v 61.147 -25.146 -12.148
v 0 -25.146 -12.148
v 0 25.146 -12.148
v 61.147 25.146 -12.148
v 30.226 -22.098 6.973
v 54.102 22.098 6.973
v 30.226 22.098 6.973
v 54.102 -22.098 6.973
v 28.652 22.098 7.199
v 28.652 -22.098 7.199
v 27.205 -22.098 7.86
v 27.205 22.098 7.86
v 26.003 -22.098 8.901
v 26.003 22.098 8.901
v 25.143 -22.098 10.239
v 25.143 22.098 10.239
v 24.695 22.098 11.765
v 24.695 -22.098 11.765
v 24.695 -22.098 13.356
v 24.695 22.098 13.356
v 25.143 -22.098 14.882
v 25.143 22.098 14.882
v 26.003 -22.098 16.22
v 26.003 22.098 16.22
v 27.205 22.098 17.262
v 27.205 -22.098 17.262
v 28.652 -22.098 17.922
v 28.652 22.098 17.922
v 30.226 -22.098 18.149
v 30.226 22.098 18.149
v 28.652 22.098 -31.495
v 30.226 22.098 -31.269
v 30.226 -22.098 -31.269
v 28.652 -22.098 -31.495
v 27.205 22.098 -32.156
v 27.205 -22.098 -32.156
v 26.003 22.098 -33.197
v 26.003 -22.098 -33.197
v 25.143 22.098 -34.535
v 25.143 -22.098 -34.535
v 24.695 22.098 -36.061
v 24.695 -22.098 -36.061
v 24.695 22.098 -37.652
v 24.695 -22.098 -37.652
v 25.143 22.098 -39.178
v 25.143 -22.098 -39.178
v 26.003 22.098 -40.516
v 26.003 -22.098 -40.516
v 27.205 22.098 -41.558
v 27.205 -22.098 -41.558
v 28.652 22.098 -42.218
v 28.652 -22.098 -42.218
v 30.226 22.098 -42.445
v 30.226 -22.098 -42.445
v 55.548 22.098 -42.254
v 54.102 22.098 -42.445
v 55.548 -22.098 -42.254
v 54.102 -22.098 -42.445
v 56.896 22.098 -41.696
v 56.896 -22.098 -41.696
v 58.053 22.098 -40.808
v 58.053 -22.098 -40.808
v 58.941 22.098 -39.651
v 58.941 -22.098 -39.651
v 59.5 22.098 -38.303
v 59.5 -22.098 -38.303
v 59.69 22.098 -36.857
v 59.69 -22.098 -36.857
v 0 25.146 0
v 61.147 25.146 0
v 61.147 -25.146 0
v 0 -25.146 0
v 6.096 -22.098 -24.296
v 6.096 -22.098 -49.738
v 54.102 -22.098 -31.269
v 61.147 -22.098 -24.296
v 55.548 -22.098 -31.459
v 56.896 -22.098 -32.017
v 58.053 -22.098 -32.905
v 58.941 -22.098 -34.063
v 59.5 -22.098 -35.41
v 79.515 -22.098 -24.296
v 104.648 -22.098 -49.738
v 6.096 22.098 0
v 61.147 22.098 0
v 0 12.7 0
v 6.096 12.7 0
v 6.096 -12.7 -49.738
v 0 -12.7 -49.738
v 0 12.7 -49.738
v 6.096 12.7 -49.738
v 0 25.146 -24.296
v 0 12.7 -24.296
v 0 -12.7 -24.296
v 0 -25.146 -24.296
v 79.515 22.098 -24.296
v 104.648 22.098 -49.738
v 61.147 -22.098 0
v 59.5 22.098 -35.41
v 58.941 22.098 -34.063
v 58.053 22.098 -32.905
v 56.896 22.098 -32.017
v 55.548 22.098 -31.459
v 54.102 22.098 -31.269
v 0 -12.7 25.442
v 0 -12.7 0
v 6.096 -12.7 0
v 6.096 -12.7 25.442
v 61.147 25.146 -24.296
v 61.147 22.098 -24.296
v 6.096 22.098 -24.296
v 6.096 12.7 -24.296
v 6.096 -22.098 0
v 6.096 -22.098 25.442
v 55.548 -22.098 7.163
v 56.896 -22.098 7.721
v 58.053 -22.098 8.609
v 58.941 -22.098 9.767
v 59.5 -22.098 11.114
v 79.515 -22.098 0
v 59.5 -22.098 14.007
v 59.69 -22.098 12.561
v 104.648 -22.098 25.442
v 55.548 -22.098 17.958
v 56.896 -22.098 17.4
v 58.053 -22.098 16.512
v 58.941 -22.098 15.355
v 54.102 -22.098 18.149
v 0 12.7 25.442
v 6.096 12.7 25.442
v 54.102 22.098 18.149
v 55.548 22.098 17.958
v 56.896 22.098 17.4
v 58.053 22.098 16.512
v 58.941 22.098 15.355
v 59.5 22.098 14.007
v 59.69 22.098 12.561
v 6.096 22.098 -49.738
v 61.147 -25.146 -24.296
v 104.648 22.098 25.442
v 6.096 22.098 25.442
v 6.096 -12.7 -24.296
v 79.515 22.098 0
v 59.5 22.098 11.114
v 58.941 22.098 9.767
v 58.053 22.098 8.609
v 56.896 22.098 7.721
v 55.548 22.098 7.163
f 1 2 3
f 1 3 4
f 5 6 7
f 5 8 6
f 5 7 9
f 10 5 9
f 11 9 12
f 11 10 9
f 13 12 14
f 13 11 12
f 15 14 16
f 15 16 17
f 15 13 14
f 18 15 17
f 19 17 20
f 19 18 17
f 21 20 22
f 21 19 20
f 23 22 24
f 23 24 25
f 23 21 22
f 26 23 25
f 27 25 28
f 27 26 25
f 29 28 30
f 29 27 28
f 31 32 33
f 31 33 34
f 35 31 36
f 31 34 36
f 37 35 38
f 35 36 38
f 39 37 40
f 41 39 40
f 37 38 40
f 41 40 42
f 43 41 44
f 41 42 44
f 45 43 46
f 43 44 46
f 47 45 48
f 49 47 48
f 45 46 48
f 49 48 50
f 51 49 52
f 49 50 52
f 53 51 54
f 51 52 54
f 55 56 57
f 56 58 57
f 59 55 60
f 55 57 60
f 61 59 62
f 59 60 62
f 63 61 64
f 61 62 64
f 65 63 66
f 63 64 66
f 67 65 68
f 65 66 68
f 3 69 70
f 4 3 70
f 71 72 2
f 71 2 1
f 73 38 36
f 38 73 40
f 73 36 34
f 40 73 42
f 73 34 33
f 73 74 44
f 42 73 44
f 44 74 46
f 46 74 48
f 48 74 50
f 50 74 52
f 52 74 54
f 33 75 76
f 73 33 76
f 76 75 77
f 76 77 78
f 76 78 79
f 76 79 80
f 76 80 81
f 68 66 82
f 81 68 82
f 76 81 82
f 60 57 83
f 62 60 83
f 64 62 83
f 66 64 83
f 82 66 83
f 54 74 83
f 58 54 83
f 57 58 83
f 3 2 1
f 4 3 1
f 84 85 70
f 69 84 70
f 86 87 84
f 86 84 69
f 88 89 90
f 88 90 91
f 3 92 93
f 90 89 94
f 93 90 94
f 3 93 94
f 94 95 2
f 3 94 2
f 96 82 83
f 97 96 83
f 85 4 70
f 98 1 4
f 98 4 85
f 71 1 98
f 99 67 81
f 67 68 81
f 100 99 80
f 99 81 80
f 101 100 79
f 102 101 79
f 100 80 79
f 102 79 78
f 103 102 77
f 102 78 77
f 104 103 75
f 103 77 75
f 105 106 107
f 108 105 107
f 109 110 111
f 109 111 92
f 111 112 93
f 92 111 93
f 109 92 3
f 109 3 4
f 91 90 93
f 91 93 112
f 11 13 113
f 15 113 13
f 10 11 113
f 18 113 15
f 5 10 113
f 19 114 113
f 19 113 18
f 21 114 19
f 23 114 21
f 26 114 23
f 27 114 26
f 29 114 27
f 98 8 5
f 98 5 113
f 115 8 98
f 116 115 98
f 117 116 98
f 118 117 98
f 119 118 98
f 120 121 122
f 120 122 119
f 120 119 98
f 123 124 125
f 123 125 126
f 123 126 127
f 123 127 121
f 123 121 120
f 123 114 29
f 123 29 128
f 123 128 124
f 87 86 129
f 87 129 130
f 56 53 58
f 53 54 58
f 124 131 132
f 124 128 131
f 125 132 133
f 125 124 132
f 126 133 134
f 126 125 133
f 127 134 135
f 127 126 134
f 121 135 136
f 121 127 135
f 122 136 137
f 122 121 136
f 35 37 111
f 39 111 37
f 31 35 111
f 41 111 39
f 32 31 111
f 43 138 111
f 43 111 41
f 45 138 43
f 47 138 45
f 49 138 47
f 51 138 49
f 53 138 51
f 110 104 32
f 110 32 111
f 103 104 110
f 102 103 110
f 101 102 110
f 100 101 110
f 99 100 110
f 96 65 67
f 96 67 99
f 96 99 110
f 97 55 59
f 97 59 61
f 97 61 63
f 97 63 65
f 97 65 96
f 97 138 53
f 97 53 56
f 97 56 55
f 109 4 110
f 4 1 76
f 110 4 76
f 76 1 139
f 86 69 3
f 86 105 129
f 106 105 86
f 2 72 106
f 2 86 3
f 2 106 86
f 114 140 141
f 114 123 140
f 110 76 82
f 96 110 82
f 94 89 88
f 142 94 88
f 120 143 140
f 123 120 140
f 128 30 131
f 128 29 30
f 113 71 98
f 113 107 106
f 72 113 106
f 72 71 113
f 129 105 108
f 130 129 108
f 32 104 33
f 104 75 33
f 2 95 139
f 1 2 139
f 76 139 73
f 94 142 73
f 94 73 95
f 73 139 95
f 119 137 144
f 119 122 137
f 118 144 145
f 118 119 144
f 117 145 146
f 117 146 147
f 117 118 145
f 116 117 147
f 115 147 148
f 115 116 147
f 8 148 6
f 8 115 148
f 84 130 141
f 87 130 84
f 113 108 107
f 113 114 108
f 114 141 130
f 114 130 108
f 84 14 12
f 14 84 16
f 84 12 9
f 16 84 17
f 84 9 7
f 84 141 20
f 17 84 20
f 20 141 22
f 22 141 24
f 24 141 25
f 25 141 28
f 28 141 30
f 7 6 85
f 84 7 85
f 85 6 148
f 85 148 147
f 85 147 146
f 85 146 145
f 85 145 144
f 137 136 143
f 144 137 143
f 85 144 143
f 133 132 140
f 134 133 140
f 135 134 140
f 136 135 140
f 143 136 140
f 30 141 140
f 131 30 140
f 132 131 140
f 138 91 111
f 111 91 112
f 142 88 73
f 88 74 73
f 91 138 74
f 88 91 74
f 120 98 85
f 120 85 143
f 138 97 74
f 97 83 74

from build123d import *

# Parameters (mm, degrees)
F0_W     = 6.096
F0_H     = 25.442303
F1_DEPTH = 12.7
F2_DEPTH = 22.098
F3_DEPTH = 25.146


with BuildPart() as f1:
    # F0 (on Front) → F1 (new body, symmetric)
    with BuildSketch(Plane.XZ):
        Polygon((6.096, 25.442303), (6.096, 0), (61.146752, 0), (66.096001, 0), (79.514757, 0), (104.648, 25.442303), (86.572984, 25.442303), (69.596, 25.442303), align=None)
        with BuildLine():
            ThreePointArc((30.226, 6.972615), (24.638, 12.560615), (30.226, 18.148615))
            Line((30.226, 18.148615), (54.102, 18.148615))
            ThreePointArc((54.102, 18.148615), (58.053313, 16.511927), (59.69, 12.560615))
            ThreePointArc((59.69, 12.560615), (58.053313, 8.609302), (54.102, 6.972615))
            Line((54.102, 6.972615), (30.226, 6.972615))
        make_face(mode=Mode.SUBTRACT)
        with Locations((3.048, 12.721151)):
            Rectangle(F0_W, F0_H)
    extrude(amount=F1_DEPTH, both=True)

    # F0 (on Front) → F2 (join, symmetric)
    with BuildSketch(Plane.XZ):
        Polygon((6.096, 25.442303), (6.096, 0), (61.146752, 0), (66.096001, 0), (79.514757, 0), (104.648, 25.442303), (86.572984, 25.442303), (69.596, 25.442303), align=None)
        with BuildLine():
            ThreePointArc((30.226, 6.972615), (24.638, 12.560615), (30.226, 18.148615))
            Line((30.226, 18.148615), (54.102, 18.148615))
            ThreePointArc((54.102, 18.148615), (58.053313, 16.511927), (59.69, 12.560615))
            ThreePointArc((59.69, 12.560615), (58.053313, 8.609302), (54.102, 6.972615))
            Line((54.102, 6.972615), (30.226, 6.972615))
        make_face(mode=Mode.SUBTRACT)
    extrude(amount=F2_DEPTH, both=True)

    # F0 (on Front) → F3 (join, symmetric)
    with BuildSketch(Plane.XZ):
        Polygon((6.096, 0), (0, 0), (0, -12.148), (61.146752, -12.148), (61.146752, 0), align=None)
    extrude(amount=F3_DEPTH, both=True)


with BuildPart() as f4_1:
    # F4: instance of F1
    add(f1.part.mirror(Plane(origin=(30.573376, 0, -12.148), x_dir=(1, 0, 0), z_dir=(0, 0, -1))))


solid = Compound([f1.part, f4_1.part])
